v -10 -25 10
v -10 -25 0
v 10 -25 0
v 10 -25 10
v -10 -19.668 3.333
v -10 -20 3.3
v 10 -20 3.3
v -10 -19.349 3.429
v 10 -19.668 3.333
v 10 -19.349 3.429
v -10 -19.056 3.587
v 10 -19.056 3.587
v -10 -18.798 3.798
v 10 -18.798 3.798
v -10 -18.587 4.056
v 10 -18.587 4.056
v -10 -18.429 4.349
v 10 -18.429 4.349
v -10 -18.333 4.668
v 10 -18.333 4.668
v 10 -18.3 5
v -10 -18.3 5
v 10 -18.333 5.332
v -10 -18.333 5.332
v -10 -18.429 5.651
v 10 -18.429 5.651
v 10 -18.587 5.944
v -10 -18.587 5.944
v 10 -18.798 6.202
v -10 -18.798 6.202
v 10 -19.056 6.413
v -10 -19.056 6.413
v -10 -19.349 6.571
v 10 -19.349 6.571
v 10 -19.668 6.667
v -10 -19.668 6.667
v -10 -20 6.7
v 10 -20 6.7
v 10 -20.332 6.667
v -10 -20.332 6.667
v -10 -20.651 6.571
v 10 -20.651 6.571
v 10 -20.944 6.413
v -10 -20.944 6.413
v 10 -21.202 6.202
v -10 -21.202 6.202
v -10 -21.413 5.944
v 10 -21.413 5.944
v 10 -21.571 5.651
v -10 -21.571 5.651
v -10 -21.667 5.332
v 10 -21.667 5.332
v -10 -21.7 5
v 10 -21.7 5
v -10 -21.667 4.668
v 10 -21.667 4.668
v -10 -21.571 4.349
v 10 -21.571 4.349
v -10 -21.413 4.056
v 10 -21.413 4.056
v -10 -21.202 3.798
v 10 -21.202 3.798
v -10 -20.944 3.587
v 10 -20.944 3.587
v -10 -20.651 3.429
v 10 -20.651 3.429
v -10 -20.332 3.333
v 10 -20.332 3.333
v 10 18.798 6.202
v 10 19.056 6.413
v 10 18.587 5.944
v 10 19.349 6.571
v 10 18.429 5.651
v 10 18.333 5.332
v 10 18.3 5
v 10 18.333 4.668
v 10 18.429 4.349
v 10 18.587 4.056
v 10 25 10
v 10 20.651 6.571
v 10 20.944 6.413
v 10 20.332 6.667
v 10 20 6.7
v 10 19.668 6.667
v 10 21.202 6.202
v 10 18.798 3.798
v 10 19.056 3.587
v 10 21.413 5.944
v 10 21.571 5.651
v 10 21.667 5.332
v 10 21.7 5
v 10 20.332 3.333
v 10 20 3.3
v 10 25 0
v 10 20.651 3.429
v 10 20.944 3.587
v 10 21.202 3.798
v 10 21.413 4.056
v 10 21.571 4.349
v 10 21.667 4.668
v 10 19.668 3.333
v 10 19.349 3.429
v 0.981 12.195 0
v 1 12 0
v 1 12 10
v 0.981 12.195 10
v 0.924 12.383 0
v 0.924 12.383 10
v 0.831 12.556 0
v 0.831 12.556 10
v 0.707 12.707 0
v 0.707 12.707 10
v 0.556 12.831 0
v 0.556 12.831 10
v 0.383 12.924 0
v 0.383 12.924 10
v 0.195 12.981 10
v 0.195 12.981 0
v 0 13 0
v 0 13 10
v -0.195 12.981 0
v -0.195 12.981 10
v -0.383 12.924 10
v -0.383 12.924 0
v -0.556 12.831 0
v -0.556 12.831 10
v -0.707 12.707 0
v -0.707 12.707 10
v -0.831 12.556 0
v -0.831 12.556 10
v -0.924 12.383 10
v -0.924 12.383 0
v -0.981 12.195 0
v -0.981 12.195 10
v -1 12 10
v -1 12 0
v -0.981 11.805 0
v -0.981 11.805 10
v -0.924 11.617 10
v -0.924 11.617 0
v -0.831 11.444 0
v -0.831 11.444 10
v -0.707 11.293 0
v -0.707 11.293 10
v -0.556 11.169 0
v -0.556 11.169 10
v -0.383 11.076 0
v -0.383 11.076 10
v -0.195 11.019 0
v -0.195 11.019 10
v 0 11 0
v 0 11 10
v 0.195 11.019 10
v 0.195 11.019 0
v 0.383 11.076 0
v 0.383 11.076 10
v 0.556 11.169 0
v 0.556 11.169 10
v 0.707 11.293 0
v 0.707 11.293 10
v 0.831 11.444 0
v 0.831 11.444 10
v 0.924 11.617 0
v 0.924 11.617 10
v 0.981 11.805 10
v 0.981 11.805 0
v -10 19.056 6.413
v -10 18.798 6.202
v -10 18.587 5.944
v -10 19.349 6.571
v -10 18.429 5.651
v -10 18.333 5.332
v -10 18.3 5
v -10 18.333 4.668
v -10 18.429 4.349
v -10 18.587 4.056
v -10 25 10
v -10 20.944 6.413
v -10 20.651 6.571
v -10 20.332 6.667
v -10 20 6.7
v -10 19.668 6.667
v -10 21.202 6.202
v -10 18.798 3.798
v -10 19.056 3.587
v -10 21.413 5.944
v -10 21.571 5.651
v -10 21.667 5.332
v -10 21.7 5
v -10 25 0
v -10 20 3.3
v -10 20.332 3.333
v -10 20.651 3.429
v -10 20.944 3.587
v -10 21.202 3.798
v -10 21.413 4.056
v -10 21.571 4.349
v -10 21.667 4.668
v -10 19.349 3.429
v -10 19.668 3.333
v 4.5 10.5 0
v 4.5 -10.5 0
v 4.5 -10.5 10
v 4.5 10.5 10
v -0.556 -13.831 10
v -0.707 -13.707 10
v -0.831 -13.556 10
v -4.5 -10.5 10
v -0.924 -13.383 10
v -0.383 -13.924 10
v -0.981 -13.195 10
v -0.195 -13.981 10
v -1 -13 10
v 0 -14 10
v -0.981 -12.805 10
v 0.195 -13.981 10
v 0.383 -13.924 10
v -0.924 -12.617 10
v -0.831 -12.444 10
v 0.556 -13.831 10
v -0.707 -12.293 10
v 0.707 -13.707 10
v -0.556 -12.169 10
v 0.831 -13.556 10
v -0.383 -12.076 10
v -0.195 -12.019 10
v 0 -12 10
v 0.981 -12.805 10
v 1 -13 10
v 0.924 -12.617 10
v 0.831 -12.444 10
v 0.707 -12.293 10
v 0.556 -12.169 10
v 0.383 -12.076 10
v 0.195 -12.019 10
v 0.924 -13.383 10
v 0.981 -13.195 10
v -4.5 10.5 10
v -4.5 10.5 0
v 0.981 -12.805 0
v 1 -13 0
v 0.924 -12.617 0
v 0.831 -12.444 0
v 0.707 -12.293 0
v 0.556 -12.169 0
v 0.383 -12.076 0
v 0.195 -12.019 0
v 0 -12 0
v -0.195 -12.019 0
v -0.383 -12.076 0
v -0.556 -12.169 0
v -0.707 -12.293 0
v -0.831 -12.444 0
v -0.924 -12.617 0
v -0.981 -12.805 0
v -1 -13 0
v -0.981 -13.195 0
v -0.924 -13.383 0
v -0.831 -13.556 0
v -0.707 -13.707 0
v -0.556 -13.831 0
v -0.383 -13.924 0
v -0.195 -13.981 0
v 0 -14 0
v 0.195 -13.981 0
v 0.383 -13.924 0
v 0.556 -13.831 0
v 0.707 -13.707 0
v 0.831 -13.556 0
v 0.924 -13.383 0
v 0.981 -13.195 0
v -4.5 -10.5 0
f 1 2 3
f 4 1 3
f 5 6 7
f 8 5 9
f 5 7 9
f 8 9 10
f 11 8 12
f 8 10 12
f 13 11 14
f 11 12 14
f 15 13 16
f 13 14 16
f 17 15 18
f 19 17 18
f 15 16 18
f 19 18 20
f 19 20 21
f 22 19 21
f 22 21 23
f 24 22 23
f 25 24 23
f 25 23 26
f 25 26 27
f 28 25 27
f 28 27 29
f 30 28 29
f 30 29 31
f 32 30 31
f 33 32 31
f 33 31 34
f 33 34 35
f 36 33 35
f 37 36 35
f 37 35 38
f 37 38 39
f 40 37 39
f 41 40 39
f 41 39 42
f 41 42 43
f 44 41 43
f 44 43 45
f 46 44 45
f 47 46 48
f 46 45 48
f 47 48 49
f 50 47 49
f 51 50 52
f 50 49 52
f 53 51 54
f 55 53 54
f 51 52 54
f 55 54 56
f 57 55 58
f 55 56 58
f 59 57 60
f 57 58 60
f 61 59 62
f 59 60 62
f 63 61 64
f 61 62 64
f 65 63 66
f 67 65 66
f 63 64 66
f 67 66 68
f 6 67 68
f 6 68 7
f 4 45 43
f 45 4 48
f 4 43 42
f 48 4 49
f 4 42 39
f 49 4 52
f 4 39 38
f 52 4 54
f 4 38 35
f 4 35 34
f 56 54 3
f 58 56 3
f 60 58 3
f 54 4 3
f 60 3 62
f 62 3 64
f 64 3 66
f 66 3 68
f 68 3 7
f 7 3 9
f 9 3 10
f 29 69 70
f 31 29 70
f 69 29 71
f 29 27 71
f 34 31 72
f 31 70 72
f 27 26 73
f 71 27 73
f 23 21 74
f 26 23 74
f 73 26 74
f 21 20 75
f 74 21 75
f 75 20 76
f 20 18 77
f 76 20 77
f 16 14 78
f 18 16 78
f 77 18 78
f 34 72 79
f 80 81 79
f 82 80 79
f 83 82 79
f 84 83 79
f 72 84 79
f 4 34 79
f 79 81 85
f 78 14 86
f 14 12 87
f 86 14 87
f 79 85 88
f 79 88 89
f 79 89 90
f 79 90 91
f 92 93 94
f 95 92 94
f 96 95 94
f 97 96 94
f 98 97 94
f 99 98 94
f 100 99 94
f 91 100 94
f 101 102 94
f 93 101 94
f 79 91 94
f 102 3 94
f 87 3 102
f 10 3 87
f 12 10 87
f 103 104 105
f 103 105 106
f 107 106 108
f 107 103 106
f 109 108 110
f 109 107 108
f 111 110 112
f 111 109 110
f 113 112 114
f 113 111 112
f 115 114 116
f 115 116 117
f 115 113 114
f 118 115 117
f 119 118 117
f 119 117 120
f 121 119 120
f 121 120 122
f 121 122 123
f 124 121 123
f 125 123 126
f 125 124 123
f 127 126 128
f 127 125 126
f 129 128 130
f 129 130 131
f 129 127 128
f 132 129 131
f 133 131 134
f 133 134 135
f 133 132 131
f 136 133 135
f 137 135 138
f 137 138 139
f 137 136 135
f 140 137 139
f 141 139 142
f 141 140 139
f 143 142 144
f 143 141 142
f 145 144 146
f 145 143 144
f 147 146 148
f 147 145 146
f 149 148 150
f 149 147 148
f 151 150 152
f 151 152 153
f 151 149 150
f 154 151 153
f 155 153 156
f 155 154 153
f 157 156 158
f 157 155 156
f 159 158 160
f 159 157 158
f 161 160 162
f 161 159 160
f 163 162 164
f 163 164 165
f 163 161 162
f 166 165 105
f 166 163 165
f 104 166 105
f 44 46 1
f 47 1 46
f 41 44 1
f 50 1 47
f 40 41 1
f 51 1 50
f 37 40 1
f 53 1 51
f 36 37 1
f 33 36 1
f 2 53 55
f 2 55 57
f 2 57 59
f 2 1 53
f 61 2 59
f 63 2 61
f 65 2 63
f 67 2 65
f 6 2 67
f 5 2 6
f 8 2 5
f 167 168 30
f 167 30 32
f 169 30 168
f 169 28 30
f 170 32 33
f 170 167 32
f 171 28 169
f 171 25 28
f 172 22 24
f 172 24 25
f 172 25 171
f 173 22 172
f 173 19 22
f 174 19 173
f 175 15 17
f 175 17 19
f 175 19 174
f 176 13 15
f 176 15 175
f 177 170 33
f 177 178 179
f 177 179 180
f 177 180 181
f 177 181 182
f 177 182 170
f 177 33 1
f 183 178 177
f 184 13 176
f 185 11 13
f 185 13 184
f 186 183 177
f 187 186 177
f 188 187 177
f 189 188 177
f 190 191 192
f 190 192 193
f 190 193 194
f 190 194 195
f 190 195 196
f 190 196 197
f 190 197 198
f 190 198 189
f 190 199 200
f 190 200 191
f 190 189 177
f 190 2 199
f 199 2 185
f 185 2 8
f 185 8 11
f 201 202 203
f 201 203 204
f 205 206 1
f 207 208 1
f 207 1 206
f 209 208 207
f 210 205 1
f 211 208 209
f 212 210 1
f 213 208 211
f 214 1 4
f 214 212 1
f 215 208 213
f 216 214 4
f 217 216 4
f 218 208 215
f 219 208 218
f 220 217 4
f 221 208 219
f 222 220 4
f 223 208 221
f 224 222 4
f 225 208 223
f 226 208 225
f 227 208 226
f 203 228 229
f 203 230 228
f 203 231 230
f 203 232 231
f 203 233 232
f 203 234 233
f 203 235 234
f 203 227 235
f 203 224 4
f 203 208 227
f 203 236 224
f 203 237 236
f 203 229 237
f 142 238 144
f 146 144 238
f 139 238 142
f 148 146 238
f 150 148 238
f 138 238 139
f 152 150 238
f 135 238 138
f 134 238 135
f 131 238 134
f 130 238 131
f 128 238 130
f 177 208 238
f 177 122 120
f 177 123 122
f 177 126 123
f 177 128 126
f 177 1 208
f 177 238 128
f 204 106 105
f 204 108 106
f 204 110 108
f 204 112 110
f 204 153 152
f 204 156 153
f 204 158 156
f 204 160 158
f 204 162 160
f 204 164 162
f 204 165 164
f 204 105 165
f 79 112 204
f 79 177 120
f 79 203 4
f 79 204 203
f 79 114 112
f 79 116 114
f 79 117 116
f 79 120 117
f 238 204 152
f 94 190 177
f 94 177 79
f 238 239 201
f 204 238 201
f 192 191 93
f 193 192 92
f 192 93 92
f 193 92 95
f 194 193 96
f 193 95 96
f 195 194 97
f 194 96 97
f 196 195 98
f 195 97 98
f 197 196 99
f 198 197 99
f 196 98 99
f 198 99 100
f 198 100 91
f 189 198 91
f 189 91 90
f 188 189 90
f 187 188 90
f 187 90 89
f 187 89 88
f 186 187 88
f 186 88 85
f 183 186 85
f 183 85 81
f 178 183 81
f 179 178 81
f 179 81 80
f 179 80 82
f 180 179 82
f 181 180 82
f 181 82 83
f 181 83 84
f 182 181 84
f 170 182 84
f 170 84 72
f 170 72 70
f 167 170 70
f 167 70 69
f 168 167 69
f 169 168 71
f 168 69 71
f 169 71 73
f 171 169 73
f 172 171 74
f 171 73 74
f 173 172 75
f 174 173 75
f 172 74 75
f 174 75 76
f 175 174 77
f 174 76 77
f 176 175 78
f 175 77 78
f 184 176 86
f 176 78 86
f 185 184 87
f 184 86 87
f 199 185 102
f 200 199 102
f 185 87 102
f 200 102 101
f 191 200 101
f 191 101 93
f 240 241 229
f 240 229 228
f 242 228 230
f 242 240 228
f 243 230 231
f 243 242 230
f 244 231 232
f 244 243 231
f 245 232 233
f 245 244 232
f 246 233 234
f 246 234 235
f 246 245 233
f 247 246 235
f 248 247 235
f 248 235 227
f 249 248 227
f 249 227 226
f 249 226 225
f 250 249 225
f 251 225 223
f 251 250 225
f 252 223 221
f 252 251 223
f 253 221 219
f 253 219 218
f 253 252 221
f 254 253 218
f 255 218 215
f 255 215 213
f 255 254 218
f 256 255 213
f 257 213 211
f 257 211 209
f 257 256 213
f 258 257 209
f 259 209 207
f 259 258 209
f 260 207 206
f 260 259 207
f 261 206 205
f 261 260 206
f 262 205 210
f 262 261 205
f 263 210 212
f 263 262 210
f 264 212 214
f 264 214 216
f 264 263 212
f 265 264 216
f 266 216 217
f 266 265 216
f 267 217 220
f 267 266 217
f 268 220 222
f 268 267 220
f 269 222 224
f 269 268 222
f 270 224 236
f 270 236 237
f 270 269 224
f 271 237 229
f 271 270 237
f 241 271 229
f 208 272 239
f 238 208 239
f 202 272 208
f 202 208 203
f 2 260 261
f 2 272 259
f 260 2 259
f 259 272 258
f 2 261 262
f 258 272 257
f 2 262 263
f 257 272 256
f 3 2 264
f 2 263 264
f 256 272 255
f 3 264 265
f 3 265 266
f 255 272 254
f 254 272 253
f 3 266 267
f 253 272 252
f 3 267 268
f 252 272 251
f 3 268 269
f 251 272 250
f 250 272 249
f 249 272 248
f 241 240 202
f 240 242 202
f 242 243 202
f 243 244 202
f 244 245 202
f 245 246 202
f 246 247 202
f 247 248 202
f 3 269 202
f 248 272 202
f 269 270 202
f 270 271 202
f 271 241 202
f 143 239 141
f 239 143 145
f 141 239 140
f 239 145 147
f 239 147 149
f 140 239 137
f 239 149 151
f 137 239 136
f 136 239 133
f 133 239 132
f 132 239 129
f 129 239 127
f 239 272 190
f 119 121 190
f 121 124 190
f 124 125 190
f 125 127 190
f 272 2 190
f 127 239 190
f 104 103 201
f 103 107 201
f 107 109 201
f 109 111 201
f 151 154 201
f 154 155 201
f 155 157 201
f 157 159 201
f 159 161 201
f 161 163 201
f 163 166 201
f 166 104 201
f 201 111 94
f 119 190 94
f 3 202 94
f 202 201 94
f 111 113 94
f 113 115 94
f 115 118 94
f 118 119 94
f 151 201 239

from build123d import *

# Parameters (mm, degrees)
SKETCH_3_W          = 20
SKETCH_3_H          = 50
SKETCH_3_R          = 1
SKETCH_3_W_2        = 9
SKETCH_3_H_2        = 21
EXTRUDE_1_DEPTH     = 10
SKETCH_4_R          = 1.7
CUT_EXTRUDE_1_DEPTH = 34.541019662


with BuildPart() as part:
    # 草图3 → 凸台-拉伸1 (new body)
    with BuildSketch(Plane.XY):
        Rectangle(SKETCH_3_W, SKETCH_3_H)
        with Locations((0, -13)):
            Circle(SKETCH_3_R, mode=Mode.SUBTRACT)
        with Locations((0, 12)):
            Circle(SKETCH_3_R, mode=Mode.SUBTRACT)
        Rectangle(SKETCH_3_W_2, SKETCH_3_H_2, mode=Mode.SUBTRACT)
    extrude(amount=EXTRUDE_1_DEPTH)

    # 草图4 → 切除-拉伸1 (cut, through all)
    with BuildSketch(Plane(origin=(10, 0, 0), x_dir=(0, 0, -1), z_dir=(1, 0, 0))):
        with Locations((-5, -20)):
            Circle(SKETCH_4_R)
        with Locations((-5, 20)):
            Circle(SKETCH_4_R)
    extrude(amount=-CUT_EXTRUDE_1_DEPTH, mode=Mode.SUBTRACT)


solid = part.part
